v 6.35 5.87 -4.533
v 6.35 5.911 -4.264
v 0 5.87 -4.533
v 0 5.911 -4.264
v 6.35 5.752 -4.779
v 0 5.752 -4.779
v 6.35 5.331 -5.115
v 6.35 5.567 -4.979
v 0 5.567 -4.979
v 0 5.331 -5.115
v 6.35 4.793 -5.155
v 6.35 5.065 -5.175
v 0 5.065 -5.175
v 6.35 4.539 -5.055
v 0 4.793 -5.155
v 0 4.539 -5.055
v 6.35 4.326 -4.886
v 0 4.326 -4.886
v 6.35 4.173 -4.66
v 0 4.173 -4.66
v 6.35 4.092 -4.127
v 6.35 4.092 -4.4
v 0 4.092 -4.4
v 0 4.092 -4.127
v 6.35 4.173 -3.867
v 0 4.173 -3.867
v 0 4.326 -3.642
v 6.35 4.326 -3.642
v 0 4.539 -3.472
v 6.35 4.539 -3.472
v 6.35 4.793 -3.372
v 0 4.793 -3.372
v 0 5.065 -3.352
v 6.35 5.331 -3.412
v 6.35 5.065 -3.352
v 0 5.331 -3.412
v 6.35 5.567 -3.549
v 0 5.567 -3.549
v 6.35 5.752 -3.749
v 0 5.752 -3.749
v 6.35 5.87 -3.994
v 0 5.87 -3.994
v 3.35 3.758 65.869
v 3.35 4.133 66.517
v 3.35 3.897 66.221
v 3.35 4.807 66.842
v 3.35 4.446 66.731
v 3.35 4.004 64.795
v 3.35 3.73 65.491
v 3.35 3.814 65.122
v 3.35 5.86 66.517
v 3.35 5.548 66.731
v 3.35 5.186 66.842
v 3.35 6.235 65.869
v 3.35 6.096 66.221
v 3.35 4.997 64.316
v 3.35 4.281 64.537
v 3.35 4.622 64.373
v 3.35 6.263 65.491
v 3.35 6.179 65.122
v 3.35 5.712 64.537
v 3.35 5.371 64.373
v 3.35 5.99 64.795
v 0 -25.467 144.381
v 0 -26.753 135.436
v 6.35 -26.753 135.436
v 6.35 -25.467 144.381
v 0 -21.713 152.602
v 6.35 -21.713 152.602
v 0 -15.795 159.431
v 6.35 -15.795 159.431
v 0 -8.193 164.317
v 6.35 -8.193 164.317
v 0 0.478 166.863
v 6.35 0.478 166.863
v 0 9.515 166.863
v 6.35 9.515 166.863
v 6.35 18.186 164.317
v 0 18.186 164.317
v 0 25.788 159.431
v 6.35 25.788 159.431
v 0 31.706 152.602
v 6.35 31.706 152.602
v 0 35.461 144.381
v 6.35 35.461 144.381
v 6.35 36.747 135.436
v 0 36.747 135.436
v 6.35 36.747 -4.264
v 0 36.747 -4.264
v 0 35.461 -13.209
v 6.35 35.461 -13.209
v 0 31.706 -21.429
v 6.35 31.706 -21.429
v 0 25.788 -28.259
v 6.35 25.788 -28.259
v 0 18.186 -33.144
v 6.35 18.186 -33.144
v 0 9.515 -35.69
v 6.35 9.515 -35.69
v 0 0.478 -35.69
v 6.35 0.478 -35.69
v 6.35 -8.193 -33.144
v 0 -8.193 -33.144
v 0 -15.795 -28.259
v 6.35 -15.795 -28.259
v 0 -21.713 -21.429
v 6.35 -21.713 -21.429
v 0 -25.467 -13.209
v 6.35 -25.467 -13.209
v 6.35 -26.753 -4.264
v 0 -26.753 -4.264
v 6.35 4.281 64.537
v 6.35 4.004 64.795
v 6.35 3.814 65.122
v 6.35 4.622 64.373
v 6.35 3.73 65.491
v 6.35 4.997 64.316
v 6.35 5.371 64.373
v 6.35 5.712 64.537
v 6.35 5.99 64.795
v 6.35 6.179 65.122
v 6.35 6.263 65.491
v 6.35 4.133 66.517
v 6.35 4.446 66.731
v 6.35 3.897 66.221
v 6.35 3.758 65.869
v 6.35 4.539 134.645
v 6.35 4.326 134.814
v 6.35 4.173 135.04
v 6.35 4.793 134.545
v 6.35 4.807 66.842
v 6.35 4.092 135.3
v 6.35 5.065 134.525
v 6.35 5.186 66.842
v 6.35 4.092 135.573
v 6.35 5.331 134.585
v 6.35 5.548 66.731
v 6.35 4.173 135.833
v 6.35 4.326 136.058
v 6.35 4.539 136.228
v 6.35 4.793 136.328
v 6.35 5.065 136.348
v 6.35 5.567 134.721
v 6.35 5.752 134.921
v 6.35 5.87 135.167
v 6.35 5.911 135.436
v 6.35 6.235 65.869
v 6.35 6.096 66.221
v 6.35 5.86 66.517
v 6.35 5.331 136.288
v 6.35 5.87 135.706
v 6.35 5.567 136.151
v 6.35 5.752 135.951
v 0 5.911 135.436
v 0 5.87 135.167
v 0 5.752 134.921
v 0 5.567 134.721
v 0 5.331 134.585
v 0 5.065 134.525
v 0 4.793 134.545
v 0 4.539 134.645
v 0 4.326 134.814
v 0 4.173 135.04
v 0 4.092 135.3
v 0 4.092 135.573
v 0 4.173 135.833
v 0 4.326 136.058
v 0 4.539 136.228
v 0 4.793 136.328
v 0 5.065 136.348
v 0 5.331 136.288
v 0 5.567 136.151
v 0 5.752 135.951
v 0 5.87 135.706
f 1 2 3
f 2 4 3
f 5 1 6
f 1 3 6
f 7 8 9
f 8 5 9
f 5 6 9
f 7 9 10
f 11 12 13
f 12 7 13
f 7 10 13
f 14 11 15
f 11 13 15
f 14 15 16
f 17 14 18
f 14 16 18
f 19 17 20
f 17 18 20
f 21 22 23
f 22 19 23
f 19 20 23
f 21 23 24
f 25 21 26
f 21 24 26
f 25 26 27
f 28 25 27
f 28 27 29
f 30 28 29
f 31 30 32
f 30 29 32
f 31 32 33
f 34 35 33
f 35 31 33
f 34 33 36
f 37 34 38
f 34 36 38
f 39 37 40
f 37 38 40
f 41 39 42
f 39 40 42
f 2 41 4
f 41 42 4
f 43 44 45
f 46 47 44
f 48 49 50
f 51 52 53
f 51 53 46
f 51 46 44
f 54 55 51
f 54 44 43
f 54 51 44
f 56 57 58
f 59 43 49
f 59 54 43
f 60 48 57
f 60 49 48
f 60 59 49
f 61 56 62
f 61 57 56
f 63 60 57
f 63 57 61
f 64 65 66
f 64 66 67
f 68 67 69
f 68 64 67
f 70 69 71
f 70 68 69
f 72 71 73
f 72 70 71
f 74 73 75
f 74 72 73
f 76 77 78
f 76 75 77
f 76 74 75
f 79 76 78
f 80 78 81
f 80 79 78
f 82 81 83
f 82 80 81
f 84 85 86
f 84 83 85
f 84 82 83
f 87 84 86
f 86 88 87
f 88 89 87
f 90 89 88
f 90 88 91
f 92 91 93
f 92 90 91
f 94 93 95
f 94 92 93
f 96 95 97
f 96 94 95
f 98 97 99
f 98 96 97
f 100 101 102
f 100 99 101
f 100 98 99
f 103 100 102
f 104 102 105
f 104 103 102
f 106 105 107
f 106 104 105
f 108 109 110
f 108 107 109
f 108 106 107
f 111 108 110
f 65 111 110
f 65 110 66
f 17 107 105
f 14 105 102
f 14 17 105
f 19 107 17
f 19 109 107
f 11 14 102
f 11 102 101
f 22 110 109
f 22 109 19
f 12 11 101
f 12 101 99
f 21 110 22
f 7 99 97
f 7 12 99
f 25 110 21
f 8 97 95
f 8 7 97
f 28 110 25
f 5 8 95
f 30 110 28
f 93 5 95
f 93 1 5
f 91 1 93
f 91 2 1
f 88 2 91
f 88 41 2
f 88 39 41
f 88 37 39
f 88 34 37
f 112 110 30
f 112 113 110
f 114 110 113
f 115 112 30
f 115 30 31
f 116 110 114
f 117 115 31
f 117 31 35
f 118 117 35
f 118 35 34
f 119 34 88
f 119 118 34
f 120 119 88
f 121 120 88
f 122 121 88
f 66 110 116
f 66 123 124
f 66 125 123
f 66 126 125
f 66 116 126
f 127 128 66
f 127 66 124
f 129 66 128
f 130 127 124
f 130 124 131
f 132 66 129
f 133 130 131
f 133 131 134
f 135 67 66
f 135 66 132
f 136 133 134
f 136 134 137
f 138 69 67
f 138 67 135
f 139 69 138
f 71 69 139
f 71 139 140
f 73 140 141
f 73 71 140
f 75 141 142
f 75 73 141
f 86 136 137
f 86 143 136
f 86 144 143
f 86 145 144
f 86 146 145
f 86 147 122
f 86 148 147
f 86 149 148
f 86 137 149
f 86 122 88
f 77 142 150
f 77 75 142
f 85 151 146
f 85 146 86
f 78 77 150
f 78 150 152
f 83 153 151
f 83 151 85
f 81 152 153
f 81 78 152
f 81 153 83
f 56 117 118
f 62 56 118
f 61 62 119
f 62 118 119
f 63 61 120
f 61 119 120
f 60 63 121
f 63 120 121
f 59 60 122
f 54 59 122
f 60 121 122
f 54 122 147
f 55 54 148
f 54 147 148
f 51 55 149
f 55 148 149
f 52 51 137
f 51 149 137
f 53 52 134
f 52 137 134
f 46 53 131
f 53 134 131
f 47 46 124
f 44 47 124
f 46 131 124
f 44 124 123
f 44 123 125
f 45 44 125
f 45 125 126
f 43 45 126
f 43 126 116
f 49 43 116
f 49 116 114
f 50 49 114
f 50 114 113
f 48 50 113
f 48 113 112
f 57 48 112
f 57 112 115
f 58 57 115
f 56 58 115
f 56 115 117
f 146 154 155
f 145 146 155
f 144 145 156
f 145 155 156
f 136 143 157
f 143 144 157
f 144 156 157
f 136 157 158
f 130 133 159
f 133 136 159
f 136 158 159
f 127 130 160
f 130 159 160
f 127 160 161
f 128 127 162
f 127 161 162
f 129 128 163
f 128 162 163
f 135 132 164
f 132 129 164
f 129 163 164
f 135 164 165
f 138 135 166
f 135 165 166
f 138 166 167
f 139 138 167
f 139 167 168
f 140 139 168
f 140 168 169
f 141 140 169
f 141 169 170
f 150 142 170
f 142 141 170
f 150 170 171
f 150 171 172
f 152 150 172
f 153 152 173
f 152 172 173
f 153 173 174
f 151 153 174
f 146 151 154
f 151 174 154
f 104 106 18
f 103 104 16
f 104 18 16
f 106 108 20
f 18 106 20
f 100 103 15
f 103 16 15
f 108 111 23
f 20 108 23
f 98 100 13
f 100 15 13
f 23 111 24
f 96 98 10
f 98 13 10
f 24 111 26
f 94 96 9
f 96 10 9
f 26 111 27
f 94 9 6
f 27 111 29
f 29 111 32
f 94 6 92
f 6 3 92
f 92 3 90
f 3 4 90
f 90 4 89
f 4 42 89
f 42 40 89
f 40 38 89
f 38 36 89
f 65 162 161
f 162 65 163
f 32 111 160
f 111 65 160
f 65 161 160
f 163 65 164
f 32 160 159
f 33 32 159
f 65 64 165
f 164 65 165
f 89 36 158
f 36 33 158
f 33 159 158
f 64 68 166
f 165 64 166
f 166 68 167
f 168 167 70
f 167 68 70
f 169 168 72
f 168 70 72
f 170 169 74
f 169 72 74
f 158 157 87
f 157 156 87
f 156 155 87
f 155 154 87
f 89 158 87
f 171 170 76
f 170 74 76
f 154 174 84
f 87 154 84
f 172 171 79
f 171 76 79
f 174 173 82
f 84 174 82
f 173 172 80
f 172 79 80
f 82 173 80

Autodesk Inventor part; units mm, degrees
ref_plane "YZ Plane" through (0, 0, 0) normal (1, 0, 0) x (0, 1, 0)
ref_plane "XZ Plane" through (0, 0, 0) normal (0, 1, 0) x (-1, 0, 0)
ref_plane "XY Plane" through (0, 0, 0) normal (0, 0, 1) x (1, 0, 0)
sketch "Sketch1" plane through (0, 0, 0) normal (1, 0, 0) x (0, 1, 0)
  arc A0 (-26.7534, -4.2636) -> (36.7466, -4.2636) centre (4.9966, -4.2636) ccw
  line L0 (36.7466, -4.2636) -> (36.7466, 65.5864)
  line L1 (-26.7534, -4.2636) -> (-26.7534, 65.5864)
  arc A1 (36.7466, 135.4364) -> (-26.7534, 135.4364) centre (4.9966, 135.4364) ccw
  line L2 (36.7466, 135.4364) -> (36.7466, 65.5864)
  line L3 (-26.7534, 135.4364) -> (-26.7534, 65.5864)
  circle A2 centre (4.9966, 135.4364) radius 0.9144
  circle A3 centre (4.9966, -4.2636) radius 0.9144
  dimension "d3" = 1.8288
  dimension "d4" = 1.8288
extrude "Extrusion1" add sketch "Sketch1" along normal blind 6.35
sketch "Sketch2" plane through (6.35, 0, 0) normal (1, 0, 0) x (0, 0, -1)
  point P0 (0, 0)
sketch "Sketch4" plane through (6.35, 0, 0) normal (1, 0, 0) x (0, 0, -1)
  circle A0 centre (-135.4364, 4.9966) radius 0.9144 projected
  circle A1 centre (4.2636, 4.9966) radius 0.9144 projected
  circle A2 centre (-65.5864, 4.9966) radius 1.27
  point P0 (0, 0)
  dimension "d14" = 2.54
extrude "Extrusion3" cut sketch "Sketch4" against normal blind 3 contours A2
properties part number "Second Arm"
